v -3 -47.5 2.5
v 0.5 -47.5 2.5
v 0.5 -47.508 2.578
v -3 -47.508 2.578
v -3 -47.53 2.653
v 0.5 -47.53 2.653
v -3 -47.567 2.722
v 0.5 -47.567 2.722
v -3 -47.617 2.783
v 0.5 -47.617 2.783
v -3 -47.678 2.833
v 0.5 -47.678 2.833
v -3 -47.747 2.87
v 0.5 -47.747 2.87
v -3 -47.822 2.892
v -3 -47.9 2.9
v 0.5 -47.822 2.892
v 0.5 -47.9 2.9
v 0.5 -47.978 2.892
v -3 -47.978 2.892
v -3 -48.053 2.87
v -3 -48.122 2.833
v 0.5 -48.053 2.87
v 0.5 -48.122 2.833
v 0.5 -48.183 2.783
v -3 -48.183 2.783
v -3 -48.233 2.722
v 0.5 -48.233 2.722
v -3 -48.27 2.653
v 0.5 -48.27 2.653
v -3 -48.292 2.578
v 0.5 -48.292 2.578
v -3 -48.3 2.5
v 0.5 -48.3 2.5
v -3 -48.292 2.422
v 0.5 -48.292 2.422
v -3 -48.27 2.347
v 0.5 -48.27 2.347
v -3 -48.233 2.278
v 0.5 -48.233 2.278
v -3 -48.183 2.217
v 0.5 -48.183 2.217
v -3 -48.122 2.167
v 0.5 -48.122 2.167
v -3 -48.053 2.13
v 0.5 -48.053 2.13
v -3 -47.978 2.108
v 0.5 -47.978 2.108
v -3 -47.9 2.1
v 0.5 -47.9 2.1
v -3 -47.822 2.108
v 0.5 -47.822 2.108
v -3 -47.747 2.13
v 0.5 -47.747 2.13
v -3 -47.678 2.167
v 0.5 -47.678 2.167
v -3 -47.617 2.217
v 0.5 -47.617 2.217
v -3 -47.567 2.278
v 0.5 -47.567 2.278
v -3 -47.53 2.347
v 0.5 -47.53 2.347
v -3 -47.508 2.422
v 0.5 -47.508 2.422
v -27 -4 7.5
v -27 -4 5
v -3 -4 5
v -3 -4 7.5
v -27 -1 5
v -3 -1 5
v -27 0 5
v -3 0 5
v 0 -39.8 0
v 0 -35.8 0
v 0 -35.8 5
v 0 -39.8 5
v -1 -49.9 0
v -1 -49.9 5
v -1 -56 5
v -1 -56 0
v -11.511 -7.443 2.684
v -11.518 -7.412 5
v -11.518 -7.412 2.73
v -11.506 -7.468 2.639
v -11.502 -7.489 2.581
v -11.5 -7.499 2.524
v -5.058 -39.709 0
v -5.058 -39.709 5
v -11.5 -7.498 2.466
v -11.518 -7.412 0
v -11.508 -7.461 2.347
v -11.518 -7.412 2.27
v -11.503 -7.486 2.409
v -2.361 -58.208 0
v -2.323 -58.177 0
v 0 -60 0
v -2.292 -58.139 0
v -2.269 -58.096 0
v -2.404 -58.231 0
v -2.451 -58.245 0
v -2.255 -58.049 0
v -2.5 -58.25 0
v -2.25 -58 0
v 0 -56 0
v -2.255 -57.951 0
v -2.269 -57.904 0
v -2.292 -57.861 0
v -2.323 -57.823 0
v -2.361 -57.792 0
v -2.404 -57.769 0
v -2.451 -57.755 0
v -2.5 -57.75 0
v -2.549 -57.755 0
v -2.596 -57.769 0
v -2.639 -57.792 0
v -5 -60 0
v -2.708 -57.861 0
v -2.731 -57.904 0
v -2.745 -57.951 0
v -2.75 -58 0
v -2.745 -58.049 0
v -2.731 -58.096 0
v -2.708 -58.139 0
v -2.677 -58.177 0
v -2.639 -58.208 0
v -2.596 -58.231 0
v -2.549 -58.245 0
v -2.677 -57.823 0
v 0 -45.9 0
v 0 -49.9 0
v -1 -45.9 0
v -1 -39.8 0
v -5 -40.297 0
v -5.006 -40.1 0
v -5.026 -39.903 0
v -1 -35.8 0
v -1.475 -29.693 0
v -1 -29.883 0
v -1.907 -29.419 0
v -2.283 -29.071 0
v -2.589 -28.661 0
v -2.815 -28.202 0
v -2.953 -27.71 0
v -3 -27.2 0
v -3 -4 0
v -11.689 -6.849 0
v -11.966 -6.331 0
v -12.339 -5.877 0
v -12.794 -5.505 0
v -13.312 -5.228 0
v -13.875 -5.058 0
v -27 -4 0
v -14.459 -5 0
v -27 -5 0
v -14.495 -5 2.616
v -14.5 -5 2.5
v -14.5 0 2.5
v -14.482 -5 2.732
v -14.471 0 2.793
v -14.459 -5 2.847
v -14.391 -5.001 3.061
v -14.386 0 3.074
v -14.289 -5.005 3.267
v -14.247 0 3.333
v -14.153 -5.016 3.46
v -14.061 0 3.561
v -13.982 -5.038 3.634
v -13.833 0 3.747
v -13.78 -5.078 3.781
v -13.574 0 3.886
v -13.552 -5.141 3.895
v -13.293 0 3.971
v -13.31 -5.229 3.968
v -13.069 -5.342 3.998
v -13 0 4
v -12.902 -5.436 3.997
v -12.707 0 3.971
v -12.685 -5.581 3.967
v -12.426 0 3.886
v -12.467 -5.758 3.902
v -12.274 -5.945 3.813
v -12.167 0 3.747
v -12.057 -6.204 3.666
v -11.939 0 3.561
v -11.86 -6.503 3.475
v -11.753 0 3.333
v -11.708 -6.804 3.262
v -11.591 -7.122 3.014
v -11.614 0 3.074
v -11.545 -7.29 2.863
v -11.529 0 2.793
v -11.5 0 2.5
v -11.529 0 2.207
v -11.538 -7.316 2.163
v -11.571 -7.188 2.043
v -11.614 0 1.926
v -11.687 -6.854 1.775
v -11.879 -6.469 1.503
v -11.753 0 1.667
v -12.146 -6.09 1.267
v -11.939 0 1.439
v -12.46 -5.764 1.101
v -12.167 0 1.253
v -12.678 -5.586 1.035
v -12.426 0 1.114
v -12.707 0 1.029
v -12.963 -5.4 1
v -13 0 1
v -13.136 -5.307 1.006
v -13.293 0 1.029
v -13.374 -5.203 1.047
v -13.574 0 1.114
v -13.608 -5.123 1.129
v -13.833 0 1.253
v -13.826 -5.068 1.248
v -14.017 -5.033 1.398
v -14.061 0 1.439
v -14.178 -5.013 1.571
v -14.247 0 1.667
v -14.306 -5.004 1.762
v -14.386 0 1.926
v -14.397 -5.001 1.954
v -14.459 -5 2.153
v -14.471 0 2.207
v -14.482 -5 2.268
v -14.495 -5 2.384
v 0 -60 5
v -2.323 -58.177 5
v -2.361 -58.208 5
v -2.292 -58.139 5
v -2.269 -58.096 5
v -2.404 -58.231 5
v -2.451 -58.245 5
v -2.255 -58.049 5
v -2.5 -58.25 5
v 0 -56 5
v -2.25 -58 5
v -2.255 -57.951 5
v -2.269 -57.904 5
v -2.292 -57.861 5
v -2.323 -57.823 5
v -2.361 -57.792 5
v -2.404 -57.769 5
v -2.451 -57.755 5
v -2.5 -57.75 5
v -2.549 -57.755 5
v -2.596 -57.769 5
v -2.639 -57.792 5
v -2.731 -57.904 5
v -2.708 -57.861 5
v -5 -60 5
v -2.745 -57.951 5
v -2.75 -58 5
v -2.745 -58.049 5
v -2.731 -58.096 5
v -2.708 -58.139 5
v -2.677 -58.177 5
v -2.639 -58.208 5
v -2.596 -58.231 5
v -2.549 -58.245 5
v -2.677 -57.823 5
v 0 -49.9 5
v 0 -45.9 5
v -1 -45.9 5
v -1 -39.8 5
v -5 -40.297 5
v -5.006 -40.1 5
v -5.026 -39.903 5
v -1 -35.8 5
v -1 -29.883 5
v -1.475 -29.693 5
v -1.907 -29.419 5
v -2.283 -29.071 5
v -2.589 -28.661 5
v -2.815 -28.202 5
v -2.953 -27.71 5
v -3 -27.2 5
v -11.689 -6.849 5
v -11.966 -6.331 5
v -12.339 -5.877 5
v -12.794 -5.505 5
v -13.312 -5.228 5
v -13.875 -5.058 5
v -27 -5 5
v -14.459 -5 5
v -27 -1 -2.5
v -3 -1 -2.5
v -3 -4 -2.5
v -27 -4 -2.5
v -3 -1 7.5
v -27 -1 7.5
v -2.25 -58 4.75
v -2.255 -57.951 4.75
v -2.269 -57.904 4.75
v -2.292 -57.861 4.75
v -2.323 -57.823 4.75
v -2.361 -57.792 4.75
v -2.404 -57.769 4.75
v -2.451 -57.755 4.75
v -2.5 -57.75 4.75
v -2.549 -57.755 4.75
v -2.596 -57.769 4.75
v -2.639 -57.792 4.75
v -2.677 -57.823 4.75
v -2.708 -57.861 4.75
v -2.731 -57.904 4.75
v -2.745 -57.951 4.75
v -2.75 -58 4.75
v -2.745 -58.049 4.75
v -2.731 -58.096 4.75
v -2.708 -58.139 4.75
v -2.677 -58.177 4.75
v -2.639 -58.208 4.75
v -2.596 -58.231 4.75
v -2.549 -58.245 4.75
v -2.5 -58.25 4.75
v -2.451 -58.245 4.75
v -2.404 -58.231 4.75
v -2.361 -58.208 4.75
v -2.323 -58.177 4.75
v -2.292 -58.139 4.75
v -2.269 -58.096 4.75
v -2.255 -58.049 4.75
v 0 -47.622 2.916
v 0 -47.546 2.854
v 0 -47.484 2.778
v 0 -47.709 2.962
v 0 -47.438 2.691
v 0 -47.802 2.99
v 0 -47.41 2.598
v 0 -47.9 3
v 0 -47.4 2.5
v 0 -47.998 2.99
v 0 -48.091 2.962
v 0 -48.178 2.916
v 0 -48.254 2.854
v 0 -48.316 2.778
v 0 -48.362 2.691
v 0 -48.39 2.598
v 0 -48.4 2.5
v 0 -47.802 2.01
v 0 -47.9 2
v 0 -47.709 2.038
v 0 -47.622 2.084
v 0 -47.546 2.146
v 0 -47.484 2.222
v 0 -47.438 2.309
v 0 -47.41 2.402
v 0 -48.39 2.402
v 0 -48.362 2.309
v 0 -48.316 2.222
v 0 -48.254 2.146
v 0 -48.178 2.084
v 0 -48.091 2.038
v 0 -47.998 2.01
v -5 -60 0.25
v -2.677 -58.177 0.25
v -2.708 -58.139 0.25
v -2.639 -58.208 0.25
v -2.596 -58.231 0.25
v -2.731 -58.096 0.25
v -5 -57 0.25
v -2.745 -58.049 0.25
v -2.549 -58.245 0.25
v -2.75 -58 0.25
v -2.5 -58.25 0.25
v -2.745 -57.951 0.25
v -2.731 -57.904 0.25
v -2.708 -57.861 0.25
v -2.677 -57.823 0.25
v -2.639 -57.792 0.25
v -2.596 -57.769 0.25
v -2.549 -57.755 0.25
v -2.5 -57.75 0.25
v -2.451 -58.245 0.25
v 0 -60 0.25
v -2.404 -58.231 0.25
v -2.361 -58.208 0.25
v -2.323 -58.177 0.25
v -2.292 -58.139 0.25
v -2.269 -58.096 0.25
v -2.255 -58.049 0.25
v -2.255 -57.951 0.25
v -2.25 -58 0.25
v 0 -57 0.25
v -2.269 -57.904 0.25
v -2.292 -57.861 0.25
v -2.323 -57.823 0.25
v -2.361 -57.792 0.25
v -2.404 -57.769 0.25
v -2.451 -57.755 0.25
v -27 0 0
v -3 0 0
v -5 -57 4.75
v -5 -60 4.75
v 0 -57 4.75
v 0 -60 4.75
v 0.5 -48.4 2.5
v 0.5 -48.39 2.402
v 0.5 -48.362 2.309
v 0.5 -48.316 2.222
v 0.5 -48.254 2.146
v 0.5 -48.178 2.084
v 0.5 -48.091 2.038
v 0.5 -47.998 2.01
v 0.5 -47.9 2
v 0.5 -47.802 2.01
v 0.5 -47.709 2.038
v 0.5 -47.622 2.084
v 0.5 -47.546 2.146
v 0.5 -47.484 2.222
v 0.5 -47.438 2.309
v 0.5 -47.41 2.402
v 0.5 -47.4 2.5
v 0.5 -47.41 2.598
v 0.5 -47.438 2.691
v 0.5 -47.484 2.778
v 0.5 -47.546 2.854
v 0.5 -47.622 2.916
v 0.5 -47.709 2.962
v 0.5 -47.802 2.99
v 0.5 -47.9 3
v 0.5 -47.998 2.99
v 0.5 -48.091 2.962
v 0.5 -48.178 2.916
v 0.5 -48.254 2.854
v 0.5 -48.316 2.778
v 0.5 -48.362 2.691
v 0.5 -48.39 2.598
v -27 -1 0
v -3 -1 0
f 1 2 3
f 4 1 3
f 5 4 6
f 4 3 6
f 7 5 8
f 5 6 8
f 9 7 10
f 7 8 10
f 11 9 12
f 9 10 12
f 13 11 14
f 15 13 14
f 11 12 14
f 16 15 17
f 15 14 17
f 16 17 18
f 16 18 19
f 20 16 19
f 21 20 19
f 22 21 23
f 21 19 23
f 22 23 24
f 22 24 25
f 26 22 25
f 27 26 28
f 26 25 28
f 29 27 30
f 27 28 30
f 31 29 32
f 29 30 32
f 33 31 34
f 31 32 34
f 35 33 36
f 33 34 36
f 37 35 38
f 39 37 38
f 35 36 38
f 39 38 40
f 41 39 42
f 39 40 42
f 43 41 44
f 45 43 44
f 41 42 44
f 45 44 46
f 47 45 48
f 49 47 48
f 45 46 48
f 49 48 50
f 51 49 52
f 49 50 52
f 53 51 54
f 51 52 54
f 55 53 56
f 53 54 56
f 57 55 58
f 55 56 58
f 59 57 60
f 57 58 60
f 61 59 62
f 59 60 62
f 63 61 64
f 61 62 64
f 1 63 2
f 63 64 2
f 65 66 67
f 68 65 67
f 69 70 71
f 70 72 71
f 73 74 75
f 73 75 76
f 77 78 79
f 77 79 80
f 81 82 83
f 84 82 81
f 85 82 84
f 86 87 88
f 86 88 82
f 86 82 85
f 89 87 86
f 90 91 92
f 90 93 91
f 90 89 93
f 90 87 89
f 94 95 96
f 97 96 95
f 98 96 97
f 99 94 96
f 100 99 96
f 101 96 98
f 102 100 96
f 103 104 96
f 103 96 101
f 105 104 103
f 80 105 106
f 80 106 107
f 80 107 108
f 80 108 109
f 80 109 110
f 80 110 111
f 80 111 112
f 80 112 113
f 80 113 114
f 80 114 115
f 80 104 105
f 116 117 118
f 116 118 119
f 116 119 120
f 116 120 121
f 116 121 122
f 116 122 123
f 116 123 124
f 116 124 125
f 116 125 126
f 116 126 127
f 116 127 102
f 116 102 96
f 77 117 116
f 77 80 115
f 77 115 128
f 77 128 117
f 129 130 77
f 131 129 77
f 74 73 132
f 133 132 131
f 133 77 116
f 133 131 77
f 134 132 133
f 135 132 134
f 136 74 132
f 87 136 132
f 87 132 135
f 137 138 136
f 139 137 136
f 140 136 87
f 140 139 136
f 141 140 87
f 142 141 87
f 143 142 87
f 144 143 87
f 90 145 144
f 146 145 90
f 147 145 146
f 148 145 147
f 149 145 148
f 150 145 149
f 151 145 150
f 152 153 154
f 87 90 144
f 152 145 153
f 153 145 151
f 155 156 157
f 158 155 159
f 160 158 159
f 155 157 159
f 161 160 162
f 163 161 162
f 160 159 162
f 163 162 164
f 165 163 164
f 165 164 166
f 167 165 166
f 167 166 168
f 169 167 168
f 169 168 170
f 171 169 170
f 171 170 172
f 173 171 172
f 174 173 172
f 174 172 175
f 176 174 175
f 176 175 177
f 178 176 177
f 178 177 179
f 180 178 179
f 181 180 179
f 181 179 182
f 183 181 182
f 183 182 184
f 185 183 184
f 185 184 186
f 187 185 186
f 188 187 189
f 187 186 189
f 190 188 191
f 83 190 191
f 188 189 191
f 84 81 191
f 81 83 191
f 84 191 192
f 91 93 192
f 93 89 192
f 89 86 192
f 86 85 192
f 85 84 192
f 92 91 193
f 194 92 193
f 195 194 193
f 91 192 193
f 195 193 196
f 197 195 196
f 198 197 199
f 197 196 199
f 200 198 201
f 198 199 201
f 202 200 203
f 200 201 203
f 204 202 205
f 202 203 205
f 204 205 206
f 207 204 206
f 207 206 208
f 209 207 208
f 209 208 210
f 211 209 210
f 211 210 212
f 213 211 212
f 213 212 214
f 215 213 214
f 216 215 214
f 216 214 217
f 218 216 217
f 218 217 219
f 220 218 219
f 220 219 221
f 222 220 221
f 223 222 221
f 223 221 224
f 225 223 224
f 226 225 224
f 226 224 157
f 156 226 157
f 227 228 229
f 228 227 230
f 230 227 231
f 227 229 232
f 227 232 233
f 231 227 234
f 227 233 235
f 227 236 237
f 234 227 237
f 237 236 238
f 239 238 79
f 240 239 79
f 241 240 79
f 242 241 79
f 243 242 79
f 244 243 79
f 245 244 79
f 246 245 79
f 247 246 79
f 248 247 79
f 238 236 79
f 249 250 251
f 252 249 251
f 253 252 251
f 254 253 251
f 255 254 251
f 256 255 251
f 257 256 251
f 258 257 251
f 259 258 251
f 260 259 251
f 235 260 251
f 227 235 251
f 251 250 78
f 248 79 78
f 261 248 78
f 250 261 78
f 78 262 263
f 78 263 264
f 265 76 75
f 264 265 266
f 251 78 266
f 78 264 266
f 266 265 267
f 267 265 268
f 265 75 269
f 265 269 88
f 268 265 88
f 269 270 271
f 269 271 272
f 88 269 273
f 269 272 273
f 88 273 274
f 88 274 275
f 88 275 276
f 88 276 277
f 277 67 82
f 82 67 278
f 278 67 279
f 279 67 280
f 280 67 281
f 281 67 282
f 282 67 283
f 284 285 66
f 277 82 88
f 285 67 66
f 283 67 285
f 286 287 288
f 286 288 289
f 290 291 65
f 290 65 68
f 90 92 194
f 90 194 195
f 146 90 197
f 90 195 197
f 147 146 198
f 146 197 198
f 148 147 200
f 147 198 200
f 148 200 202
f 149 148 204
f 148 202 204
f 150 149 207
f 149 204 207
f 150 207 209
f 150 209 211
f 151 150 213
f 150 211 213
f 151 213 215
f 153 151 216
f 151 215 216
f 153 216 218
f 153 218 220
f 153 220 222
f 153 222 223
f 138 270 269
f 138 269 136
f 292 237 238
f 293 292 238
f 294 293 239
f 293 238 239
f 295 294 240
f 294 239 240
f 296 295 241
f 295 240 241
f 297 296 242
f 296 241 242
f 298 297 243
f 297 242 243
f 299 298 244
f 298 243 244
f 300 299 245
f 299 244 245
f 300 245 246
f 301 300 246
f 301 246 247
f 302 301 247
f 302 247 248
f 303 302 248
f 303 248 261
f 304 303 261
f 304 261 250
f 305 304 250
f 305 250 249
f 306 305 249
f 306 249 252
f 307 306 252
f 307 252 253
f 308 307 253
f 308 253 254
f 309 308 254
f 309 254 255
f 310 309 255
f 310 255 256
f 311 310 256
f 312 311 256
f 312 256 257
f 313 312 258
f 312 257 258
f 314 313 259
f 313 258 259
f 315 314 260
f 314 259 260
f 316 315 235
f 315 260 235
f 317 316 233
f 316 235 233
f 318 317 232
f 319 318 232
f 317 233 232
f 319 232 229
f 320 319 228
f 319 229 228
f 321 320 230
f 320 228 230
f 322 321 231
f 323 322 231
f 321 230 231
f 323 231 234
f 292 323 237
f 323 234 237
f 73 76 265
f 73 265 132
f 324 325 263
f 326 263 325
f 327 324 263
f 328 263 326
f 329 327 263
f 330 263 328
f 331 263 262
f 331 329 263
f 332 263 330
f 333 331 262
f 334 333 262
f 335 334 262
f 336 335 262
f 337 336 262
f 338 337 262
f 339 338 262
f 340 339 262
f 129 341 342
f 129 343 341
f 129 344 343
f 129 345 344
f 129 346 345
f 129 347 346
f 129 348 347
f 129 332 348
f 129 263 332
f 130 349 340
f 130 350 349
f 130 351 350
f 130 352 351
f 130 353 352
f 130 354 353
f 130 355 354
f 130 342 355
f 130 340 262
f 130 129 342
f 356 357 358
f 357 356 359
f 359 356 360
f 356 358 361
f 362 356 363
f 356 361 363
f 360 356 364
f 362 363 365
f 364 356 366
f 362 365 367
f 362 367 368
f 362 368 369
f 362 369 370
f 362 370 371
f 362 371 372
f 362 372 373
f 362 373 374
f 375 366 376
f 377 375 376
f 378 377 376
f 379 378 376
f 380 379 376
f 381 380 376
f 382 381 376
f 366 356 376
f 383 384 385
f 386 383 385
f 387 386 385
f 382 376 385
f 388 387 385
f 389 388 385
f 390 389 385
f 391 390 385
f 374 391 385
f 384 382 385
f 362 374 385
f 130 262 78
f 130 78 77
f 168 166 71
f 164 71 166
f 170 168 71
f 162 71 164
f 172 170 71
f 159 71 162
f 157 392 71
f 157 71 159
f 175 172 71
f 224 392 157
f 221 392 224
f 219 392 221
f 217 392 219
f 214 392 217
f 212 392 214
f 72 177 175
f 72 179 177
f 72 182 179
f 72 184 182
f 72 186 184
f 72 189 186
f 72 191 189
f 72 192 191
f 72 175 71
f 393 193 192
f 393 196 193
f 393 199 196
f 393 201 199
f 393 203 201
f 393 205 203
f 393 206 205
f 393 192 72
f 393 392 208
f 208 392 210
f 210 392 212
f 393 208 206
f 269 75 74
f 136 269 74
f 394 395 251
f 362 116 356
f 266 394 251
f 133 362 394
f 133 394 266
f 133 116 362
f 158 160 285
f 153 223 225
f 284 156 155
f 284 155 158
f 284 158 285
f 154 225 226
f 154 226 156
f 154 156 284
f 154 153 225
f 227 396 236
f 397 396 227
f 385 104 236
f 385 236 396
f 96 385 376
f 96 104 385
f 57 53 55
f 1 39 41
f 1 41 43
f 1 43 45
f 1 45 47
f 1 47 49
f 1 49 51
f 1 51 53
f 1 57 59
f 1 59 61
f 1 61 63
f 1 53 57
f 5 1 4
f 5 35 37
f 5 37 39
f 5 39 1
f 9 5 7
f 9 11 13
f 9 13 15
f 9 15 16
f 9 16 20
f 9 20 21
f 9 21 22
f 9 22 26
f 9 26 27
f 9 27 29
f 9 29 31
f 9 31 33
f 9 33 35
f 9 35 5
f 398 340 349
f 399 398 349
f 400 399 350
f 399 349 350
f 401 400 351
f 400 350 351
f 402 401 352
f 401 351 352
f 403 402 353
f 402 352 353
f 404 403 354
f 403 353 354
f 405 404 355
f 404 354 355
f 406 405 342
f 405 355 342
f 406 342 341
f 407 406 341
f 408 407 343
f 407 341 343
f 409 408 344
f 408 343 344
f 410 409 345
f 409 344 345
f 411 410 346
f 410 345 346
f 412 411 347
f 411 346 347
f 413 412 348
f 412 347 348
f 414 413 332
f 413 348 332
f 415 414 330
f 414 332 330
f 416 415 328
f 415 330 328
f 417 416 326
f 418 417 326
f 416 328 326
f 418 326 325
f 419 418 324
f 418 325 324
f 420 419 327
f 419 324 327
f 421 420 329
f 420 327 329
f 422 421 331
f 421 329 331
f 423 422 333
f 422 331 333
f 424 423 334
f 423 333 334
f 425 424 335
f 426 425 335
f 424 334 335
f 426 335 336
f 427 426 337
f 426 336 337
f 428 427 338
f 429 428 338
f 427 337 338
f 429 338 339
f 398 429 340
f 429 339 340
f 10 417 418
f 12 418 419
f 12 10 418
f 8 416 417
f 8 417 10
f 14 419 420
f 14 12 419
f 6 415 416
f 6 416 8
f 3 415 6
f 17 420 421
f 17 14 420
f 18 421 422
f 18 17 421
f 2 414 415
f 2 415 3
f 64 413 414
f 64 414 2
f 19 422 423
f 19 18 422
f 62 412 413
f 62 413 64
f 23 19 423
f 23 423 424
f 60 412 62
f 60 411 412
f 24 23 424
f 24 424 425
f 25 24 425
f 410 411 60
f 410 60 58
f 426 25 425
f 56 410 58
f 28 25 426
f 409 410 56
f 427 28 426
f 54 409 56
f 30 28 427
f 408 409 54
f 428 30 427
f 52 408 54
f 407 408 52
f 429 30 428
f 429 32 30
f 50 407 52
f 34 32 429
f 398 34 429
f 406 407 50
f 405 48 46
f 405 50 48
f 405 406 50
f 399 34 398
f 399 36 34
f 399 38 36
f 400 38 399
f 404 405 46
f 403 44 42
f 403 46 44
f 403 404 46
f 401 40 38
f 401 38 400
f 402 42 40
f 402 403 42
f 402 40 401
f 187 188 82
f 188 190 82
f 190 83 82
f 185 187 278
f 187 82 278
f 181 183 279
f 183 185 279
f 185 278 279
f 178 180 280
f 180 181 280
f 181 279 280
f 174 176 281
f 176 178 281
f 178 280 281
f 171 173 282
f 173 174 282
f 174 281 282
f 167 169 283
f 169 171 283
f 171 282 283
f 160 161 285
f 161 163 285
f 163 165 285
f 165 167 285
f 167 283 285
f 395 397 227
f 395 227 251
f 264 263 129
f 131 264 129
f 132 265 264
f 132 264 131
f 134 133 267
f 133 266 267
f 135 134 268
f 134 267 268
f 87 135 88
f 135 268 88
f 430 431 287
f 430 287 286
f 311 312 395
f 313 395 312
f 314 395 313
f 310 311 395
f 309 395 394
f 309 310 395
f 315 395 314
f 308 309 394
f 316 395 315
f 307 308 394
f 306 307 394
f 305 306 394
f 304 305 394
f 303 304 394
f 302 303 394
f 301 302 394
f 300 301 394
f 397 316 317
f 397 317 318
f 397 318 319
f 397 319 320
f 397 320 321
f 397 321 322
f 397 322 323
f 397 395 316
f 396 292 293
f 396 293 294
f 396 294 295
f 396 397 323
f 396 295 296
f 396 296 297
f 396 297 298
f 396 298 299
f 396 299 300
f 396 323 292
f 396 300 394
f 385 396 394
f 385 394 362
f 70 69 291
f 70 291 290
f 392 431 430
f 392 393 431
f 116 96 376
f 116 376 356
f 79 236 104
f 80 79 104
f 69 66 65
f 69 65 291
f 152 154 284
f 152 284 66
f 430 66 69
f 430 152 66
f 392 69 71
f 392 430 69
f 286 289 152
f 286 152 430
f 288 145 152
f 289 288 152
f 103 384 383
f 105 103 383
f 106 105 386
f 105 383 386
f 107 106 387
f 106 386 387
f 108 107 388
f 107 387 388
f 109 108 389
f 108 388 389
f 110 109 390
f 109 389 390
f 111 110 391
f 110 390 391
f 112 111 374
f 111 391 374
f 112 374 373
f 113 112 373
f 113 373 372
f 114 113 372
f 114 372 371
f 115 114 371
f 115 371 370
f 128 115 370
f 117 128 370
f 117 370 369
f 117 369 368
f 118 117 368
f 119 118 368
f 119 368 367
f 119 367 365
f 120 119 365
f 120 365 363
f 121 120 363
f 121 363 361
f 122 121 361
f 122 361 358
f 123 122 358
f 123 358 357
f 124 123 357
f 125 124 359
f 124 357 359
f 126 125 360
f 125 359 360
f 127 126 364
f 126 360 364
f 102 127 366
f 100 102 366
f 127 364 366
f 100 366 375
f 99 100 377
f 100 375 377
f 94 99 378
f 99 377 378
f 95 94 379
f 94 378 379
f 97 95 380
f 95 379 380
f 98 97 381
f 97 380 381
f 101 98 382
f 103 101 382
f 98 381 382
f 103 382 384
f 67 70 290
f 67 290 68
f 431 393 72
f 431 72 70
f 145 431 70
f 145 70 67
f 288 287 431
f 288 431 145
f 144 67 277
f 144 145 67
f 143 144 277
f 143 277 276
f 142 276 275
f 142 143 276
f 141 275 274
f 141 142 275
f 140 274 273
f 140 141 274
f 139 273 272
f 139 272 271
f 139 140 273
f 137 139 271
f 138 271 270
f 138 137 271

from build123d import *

# Parameters (mm, degrees)
BOSS_EXTRUDE1_DEPTH = 5
FILLET1_R           = 3
SKETCH2_W           = 24
SKETCH2_H           = 3
BOSS_EXTRUDE2_DEPTH = 2.5
SKETCH3_W           = 24
SKETCH3_H           = 3
BOSS_EXTRUDE3_DEPTH = 2.5
SKETCH4_W           = 5
SKETCH4_H           = 6.1
CUT_EXTRUDE1_DEPTH  = 1
SKETCH5_R           = 1.5
CUT_EXTRUDE2_DEPTH  = 14
SKETCH7_R           = 0.25
CUT_EXTRUDE3_DEPTH  = 10
SKETCH8_W           = 4.5
SKETCH8_H           = 3
CUT_EXTRUDE4_DEPTH  = 5
SKETCH12_R          = 0.5
BOSS_EXTRUDE4_DEPTH = 0.5
SKETCH13_R          = 0.4
CUT_EXTRUDE5_DEPTH  = 3.5


with BuildPart() as part:
    # Sketch1 → Boss-Extrude1 (new body)
    with BuildSketch(Plane.XY):
        with BuildLine():
            Line((0, -60), (-5, -60))
            Line((-5, -60), (-5, -40))
            Line((-5, -40), (-12, -5))
            Line((-12, -5), (-27, -5))
            Line((-27, -5), (-27, 0))
            Line((-27, 0), (-3, 0))
            Line((-3, 0), (-3, -27.2))
            ThreePointArc((-3, -27.2), (-2.179898987, -29.179898987), (-0.2, -30))
            Line((-0.2, -30), (0, -30))
            Line((0, -30), (0, -60))
        make_face()
    extrude(amount=BOSS_EXTRUDE1_DEPTH)

    # Fillet1
    fillet1_edges = [part.edges().sort_by_distance(p)[0] for p in [
        (-5, -40, 2.5),
        (-12, -5, 2.5),
    ]]
    fillet(fillet1_edges, radius=FILLET1_R)

    # Sketch2 → Boss-Extrude2 (add)
    with BuildSketch(Plane.XY.offset(5)):
        with Locations((-15, -2.5)):
            Rectangle(SKETCH2_W, SKETCH2_H)
    extrude(amount=BOSS_EXTRUDE2_DEPTH)

    # Sketch3 → Boss-Extrude3 (add)
    with BuildSketch(Plane(origin=(0, 0, 0), x_dir=(-1, 0, 0), z_dir=(0, 0, -1))):
        with Locations((15, -2.5)):
            Rectangle(SKETCH3_W, SKETCH3_H)
    extrude(amount=BOSS_EXTRUDE3_DEPTH)

    # Sketch4 → Cut-Extrude1 (cut)
    with BuildSketch(Plane(origin=(0, 0, 0), x_dir=(0, 0, -1), z_dir=(1, 0, 0))):
        with Locations((-2.5, -52.95)):
            Rectangle(SKETCH4_W, SKETCH4_H)
        with Locations((-2.5, -42.85)):
            Rectangle(SKETCH4_W, SKETCH4_H)
        with Locations((-2.5, -32.75)):
            Rectangle(SKETCH4_W, SKETCH4_H)
        with Locations((-2.5, -22.65)):
            Rectangle(SKETCH4_W, SKETCH4_H)
        with Locations((-2.5, -12.55)):
            Rectangle(SKETCH4_W, SKETCH4_H)
        with Locations((-2.5, -2.45)):
            Rectangle(SKETCH4_W, SKETCH4_H)
    extrude(amount=-CUT_EXTRUDE1_DEPTH, mode=Mode.SUBTRACT)

    # Sketch5 → Cut-Extrude2 (cut)
    with BuildSketch(Plane(origin=(0, 0, 0), x_dir=(1, 0, 0), z_dir=(0, 1, 0))):
        with Locations(Location((-13, -2.5, 0), (0, 0, 180))):
            Circle(SKETCH5_R)
    extrude(amount=-CUT_EXTRUDE2_DEPTH, mode=Mode.SUBTRACT)

    # Sketch7 → Cut-Extrude3 (cut)
    with BuildSketch(Plane.XY.offset(5)):
        with Locations((-2.5, -58)):
            Circle(SKETCH7_R)
    extrude(amount=-CUT_EXTRUDE3_DEPTH, mode=Mode.SUBTRACT)

    # Sketch8 → Cut-Extrude4 (cut)
    with BuildSketch(Plane(origin=(0, 0, 0), x_dir=(0, 0, -1), z_dir=(1, 0, 0))):
        with Locations((-2.5, -58.5)):
            Rectangle(SKETCH8_W, SKETCH8_H)
    extrude(amount=-CUT_EXTRUDE4_DEPTH, mode=Mode.SUBTRACT)

    # Sketch12 → Boss-Extrude4 (add)
    with BuildSketch(Plane(origin=(0, 0, 0), x_dir=(0, 0, -1), z_dir=(1, 0, 0))):
        with Locations(Location((-2.5, -47.9, 0), (0, 0, 270))):
            Circle(SKETCH12_R)
    extrude(amount=BOSS_EXTRUDE4_DEPTH)

    # Sketch13 → Cut-Extrude5 (cut)
    with BuildSketch(Plane(origin=(0.5, 0, 0), x_dir=(0, 0, -1), z_dir=(1, 0, 0))):
        with Locations(Location((-2.5, -47.9, 0), (0, 0, 90))):
            Circle(SKETCH13_R)
    extrude(amount=-CUT_EXTRUDE5_DEPTH, mode=Mode.SUBTRACT)


solid = part.part
